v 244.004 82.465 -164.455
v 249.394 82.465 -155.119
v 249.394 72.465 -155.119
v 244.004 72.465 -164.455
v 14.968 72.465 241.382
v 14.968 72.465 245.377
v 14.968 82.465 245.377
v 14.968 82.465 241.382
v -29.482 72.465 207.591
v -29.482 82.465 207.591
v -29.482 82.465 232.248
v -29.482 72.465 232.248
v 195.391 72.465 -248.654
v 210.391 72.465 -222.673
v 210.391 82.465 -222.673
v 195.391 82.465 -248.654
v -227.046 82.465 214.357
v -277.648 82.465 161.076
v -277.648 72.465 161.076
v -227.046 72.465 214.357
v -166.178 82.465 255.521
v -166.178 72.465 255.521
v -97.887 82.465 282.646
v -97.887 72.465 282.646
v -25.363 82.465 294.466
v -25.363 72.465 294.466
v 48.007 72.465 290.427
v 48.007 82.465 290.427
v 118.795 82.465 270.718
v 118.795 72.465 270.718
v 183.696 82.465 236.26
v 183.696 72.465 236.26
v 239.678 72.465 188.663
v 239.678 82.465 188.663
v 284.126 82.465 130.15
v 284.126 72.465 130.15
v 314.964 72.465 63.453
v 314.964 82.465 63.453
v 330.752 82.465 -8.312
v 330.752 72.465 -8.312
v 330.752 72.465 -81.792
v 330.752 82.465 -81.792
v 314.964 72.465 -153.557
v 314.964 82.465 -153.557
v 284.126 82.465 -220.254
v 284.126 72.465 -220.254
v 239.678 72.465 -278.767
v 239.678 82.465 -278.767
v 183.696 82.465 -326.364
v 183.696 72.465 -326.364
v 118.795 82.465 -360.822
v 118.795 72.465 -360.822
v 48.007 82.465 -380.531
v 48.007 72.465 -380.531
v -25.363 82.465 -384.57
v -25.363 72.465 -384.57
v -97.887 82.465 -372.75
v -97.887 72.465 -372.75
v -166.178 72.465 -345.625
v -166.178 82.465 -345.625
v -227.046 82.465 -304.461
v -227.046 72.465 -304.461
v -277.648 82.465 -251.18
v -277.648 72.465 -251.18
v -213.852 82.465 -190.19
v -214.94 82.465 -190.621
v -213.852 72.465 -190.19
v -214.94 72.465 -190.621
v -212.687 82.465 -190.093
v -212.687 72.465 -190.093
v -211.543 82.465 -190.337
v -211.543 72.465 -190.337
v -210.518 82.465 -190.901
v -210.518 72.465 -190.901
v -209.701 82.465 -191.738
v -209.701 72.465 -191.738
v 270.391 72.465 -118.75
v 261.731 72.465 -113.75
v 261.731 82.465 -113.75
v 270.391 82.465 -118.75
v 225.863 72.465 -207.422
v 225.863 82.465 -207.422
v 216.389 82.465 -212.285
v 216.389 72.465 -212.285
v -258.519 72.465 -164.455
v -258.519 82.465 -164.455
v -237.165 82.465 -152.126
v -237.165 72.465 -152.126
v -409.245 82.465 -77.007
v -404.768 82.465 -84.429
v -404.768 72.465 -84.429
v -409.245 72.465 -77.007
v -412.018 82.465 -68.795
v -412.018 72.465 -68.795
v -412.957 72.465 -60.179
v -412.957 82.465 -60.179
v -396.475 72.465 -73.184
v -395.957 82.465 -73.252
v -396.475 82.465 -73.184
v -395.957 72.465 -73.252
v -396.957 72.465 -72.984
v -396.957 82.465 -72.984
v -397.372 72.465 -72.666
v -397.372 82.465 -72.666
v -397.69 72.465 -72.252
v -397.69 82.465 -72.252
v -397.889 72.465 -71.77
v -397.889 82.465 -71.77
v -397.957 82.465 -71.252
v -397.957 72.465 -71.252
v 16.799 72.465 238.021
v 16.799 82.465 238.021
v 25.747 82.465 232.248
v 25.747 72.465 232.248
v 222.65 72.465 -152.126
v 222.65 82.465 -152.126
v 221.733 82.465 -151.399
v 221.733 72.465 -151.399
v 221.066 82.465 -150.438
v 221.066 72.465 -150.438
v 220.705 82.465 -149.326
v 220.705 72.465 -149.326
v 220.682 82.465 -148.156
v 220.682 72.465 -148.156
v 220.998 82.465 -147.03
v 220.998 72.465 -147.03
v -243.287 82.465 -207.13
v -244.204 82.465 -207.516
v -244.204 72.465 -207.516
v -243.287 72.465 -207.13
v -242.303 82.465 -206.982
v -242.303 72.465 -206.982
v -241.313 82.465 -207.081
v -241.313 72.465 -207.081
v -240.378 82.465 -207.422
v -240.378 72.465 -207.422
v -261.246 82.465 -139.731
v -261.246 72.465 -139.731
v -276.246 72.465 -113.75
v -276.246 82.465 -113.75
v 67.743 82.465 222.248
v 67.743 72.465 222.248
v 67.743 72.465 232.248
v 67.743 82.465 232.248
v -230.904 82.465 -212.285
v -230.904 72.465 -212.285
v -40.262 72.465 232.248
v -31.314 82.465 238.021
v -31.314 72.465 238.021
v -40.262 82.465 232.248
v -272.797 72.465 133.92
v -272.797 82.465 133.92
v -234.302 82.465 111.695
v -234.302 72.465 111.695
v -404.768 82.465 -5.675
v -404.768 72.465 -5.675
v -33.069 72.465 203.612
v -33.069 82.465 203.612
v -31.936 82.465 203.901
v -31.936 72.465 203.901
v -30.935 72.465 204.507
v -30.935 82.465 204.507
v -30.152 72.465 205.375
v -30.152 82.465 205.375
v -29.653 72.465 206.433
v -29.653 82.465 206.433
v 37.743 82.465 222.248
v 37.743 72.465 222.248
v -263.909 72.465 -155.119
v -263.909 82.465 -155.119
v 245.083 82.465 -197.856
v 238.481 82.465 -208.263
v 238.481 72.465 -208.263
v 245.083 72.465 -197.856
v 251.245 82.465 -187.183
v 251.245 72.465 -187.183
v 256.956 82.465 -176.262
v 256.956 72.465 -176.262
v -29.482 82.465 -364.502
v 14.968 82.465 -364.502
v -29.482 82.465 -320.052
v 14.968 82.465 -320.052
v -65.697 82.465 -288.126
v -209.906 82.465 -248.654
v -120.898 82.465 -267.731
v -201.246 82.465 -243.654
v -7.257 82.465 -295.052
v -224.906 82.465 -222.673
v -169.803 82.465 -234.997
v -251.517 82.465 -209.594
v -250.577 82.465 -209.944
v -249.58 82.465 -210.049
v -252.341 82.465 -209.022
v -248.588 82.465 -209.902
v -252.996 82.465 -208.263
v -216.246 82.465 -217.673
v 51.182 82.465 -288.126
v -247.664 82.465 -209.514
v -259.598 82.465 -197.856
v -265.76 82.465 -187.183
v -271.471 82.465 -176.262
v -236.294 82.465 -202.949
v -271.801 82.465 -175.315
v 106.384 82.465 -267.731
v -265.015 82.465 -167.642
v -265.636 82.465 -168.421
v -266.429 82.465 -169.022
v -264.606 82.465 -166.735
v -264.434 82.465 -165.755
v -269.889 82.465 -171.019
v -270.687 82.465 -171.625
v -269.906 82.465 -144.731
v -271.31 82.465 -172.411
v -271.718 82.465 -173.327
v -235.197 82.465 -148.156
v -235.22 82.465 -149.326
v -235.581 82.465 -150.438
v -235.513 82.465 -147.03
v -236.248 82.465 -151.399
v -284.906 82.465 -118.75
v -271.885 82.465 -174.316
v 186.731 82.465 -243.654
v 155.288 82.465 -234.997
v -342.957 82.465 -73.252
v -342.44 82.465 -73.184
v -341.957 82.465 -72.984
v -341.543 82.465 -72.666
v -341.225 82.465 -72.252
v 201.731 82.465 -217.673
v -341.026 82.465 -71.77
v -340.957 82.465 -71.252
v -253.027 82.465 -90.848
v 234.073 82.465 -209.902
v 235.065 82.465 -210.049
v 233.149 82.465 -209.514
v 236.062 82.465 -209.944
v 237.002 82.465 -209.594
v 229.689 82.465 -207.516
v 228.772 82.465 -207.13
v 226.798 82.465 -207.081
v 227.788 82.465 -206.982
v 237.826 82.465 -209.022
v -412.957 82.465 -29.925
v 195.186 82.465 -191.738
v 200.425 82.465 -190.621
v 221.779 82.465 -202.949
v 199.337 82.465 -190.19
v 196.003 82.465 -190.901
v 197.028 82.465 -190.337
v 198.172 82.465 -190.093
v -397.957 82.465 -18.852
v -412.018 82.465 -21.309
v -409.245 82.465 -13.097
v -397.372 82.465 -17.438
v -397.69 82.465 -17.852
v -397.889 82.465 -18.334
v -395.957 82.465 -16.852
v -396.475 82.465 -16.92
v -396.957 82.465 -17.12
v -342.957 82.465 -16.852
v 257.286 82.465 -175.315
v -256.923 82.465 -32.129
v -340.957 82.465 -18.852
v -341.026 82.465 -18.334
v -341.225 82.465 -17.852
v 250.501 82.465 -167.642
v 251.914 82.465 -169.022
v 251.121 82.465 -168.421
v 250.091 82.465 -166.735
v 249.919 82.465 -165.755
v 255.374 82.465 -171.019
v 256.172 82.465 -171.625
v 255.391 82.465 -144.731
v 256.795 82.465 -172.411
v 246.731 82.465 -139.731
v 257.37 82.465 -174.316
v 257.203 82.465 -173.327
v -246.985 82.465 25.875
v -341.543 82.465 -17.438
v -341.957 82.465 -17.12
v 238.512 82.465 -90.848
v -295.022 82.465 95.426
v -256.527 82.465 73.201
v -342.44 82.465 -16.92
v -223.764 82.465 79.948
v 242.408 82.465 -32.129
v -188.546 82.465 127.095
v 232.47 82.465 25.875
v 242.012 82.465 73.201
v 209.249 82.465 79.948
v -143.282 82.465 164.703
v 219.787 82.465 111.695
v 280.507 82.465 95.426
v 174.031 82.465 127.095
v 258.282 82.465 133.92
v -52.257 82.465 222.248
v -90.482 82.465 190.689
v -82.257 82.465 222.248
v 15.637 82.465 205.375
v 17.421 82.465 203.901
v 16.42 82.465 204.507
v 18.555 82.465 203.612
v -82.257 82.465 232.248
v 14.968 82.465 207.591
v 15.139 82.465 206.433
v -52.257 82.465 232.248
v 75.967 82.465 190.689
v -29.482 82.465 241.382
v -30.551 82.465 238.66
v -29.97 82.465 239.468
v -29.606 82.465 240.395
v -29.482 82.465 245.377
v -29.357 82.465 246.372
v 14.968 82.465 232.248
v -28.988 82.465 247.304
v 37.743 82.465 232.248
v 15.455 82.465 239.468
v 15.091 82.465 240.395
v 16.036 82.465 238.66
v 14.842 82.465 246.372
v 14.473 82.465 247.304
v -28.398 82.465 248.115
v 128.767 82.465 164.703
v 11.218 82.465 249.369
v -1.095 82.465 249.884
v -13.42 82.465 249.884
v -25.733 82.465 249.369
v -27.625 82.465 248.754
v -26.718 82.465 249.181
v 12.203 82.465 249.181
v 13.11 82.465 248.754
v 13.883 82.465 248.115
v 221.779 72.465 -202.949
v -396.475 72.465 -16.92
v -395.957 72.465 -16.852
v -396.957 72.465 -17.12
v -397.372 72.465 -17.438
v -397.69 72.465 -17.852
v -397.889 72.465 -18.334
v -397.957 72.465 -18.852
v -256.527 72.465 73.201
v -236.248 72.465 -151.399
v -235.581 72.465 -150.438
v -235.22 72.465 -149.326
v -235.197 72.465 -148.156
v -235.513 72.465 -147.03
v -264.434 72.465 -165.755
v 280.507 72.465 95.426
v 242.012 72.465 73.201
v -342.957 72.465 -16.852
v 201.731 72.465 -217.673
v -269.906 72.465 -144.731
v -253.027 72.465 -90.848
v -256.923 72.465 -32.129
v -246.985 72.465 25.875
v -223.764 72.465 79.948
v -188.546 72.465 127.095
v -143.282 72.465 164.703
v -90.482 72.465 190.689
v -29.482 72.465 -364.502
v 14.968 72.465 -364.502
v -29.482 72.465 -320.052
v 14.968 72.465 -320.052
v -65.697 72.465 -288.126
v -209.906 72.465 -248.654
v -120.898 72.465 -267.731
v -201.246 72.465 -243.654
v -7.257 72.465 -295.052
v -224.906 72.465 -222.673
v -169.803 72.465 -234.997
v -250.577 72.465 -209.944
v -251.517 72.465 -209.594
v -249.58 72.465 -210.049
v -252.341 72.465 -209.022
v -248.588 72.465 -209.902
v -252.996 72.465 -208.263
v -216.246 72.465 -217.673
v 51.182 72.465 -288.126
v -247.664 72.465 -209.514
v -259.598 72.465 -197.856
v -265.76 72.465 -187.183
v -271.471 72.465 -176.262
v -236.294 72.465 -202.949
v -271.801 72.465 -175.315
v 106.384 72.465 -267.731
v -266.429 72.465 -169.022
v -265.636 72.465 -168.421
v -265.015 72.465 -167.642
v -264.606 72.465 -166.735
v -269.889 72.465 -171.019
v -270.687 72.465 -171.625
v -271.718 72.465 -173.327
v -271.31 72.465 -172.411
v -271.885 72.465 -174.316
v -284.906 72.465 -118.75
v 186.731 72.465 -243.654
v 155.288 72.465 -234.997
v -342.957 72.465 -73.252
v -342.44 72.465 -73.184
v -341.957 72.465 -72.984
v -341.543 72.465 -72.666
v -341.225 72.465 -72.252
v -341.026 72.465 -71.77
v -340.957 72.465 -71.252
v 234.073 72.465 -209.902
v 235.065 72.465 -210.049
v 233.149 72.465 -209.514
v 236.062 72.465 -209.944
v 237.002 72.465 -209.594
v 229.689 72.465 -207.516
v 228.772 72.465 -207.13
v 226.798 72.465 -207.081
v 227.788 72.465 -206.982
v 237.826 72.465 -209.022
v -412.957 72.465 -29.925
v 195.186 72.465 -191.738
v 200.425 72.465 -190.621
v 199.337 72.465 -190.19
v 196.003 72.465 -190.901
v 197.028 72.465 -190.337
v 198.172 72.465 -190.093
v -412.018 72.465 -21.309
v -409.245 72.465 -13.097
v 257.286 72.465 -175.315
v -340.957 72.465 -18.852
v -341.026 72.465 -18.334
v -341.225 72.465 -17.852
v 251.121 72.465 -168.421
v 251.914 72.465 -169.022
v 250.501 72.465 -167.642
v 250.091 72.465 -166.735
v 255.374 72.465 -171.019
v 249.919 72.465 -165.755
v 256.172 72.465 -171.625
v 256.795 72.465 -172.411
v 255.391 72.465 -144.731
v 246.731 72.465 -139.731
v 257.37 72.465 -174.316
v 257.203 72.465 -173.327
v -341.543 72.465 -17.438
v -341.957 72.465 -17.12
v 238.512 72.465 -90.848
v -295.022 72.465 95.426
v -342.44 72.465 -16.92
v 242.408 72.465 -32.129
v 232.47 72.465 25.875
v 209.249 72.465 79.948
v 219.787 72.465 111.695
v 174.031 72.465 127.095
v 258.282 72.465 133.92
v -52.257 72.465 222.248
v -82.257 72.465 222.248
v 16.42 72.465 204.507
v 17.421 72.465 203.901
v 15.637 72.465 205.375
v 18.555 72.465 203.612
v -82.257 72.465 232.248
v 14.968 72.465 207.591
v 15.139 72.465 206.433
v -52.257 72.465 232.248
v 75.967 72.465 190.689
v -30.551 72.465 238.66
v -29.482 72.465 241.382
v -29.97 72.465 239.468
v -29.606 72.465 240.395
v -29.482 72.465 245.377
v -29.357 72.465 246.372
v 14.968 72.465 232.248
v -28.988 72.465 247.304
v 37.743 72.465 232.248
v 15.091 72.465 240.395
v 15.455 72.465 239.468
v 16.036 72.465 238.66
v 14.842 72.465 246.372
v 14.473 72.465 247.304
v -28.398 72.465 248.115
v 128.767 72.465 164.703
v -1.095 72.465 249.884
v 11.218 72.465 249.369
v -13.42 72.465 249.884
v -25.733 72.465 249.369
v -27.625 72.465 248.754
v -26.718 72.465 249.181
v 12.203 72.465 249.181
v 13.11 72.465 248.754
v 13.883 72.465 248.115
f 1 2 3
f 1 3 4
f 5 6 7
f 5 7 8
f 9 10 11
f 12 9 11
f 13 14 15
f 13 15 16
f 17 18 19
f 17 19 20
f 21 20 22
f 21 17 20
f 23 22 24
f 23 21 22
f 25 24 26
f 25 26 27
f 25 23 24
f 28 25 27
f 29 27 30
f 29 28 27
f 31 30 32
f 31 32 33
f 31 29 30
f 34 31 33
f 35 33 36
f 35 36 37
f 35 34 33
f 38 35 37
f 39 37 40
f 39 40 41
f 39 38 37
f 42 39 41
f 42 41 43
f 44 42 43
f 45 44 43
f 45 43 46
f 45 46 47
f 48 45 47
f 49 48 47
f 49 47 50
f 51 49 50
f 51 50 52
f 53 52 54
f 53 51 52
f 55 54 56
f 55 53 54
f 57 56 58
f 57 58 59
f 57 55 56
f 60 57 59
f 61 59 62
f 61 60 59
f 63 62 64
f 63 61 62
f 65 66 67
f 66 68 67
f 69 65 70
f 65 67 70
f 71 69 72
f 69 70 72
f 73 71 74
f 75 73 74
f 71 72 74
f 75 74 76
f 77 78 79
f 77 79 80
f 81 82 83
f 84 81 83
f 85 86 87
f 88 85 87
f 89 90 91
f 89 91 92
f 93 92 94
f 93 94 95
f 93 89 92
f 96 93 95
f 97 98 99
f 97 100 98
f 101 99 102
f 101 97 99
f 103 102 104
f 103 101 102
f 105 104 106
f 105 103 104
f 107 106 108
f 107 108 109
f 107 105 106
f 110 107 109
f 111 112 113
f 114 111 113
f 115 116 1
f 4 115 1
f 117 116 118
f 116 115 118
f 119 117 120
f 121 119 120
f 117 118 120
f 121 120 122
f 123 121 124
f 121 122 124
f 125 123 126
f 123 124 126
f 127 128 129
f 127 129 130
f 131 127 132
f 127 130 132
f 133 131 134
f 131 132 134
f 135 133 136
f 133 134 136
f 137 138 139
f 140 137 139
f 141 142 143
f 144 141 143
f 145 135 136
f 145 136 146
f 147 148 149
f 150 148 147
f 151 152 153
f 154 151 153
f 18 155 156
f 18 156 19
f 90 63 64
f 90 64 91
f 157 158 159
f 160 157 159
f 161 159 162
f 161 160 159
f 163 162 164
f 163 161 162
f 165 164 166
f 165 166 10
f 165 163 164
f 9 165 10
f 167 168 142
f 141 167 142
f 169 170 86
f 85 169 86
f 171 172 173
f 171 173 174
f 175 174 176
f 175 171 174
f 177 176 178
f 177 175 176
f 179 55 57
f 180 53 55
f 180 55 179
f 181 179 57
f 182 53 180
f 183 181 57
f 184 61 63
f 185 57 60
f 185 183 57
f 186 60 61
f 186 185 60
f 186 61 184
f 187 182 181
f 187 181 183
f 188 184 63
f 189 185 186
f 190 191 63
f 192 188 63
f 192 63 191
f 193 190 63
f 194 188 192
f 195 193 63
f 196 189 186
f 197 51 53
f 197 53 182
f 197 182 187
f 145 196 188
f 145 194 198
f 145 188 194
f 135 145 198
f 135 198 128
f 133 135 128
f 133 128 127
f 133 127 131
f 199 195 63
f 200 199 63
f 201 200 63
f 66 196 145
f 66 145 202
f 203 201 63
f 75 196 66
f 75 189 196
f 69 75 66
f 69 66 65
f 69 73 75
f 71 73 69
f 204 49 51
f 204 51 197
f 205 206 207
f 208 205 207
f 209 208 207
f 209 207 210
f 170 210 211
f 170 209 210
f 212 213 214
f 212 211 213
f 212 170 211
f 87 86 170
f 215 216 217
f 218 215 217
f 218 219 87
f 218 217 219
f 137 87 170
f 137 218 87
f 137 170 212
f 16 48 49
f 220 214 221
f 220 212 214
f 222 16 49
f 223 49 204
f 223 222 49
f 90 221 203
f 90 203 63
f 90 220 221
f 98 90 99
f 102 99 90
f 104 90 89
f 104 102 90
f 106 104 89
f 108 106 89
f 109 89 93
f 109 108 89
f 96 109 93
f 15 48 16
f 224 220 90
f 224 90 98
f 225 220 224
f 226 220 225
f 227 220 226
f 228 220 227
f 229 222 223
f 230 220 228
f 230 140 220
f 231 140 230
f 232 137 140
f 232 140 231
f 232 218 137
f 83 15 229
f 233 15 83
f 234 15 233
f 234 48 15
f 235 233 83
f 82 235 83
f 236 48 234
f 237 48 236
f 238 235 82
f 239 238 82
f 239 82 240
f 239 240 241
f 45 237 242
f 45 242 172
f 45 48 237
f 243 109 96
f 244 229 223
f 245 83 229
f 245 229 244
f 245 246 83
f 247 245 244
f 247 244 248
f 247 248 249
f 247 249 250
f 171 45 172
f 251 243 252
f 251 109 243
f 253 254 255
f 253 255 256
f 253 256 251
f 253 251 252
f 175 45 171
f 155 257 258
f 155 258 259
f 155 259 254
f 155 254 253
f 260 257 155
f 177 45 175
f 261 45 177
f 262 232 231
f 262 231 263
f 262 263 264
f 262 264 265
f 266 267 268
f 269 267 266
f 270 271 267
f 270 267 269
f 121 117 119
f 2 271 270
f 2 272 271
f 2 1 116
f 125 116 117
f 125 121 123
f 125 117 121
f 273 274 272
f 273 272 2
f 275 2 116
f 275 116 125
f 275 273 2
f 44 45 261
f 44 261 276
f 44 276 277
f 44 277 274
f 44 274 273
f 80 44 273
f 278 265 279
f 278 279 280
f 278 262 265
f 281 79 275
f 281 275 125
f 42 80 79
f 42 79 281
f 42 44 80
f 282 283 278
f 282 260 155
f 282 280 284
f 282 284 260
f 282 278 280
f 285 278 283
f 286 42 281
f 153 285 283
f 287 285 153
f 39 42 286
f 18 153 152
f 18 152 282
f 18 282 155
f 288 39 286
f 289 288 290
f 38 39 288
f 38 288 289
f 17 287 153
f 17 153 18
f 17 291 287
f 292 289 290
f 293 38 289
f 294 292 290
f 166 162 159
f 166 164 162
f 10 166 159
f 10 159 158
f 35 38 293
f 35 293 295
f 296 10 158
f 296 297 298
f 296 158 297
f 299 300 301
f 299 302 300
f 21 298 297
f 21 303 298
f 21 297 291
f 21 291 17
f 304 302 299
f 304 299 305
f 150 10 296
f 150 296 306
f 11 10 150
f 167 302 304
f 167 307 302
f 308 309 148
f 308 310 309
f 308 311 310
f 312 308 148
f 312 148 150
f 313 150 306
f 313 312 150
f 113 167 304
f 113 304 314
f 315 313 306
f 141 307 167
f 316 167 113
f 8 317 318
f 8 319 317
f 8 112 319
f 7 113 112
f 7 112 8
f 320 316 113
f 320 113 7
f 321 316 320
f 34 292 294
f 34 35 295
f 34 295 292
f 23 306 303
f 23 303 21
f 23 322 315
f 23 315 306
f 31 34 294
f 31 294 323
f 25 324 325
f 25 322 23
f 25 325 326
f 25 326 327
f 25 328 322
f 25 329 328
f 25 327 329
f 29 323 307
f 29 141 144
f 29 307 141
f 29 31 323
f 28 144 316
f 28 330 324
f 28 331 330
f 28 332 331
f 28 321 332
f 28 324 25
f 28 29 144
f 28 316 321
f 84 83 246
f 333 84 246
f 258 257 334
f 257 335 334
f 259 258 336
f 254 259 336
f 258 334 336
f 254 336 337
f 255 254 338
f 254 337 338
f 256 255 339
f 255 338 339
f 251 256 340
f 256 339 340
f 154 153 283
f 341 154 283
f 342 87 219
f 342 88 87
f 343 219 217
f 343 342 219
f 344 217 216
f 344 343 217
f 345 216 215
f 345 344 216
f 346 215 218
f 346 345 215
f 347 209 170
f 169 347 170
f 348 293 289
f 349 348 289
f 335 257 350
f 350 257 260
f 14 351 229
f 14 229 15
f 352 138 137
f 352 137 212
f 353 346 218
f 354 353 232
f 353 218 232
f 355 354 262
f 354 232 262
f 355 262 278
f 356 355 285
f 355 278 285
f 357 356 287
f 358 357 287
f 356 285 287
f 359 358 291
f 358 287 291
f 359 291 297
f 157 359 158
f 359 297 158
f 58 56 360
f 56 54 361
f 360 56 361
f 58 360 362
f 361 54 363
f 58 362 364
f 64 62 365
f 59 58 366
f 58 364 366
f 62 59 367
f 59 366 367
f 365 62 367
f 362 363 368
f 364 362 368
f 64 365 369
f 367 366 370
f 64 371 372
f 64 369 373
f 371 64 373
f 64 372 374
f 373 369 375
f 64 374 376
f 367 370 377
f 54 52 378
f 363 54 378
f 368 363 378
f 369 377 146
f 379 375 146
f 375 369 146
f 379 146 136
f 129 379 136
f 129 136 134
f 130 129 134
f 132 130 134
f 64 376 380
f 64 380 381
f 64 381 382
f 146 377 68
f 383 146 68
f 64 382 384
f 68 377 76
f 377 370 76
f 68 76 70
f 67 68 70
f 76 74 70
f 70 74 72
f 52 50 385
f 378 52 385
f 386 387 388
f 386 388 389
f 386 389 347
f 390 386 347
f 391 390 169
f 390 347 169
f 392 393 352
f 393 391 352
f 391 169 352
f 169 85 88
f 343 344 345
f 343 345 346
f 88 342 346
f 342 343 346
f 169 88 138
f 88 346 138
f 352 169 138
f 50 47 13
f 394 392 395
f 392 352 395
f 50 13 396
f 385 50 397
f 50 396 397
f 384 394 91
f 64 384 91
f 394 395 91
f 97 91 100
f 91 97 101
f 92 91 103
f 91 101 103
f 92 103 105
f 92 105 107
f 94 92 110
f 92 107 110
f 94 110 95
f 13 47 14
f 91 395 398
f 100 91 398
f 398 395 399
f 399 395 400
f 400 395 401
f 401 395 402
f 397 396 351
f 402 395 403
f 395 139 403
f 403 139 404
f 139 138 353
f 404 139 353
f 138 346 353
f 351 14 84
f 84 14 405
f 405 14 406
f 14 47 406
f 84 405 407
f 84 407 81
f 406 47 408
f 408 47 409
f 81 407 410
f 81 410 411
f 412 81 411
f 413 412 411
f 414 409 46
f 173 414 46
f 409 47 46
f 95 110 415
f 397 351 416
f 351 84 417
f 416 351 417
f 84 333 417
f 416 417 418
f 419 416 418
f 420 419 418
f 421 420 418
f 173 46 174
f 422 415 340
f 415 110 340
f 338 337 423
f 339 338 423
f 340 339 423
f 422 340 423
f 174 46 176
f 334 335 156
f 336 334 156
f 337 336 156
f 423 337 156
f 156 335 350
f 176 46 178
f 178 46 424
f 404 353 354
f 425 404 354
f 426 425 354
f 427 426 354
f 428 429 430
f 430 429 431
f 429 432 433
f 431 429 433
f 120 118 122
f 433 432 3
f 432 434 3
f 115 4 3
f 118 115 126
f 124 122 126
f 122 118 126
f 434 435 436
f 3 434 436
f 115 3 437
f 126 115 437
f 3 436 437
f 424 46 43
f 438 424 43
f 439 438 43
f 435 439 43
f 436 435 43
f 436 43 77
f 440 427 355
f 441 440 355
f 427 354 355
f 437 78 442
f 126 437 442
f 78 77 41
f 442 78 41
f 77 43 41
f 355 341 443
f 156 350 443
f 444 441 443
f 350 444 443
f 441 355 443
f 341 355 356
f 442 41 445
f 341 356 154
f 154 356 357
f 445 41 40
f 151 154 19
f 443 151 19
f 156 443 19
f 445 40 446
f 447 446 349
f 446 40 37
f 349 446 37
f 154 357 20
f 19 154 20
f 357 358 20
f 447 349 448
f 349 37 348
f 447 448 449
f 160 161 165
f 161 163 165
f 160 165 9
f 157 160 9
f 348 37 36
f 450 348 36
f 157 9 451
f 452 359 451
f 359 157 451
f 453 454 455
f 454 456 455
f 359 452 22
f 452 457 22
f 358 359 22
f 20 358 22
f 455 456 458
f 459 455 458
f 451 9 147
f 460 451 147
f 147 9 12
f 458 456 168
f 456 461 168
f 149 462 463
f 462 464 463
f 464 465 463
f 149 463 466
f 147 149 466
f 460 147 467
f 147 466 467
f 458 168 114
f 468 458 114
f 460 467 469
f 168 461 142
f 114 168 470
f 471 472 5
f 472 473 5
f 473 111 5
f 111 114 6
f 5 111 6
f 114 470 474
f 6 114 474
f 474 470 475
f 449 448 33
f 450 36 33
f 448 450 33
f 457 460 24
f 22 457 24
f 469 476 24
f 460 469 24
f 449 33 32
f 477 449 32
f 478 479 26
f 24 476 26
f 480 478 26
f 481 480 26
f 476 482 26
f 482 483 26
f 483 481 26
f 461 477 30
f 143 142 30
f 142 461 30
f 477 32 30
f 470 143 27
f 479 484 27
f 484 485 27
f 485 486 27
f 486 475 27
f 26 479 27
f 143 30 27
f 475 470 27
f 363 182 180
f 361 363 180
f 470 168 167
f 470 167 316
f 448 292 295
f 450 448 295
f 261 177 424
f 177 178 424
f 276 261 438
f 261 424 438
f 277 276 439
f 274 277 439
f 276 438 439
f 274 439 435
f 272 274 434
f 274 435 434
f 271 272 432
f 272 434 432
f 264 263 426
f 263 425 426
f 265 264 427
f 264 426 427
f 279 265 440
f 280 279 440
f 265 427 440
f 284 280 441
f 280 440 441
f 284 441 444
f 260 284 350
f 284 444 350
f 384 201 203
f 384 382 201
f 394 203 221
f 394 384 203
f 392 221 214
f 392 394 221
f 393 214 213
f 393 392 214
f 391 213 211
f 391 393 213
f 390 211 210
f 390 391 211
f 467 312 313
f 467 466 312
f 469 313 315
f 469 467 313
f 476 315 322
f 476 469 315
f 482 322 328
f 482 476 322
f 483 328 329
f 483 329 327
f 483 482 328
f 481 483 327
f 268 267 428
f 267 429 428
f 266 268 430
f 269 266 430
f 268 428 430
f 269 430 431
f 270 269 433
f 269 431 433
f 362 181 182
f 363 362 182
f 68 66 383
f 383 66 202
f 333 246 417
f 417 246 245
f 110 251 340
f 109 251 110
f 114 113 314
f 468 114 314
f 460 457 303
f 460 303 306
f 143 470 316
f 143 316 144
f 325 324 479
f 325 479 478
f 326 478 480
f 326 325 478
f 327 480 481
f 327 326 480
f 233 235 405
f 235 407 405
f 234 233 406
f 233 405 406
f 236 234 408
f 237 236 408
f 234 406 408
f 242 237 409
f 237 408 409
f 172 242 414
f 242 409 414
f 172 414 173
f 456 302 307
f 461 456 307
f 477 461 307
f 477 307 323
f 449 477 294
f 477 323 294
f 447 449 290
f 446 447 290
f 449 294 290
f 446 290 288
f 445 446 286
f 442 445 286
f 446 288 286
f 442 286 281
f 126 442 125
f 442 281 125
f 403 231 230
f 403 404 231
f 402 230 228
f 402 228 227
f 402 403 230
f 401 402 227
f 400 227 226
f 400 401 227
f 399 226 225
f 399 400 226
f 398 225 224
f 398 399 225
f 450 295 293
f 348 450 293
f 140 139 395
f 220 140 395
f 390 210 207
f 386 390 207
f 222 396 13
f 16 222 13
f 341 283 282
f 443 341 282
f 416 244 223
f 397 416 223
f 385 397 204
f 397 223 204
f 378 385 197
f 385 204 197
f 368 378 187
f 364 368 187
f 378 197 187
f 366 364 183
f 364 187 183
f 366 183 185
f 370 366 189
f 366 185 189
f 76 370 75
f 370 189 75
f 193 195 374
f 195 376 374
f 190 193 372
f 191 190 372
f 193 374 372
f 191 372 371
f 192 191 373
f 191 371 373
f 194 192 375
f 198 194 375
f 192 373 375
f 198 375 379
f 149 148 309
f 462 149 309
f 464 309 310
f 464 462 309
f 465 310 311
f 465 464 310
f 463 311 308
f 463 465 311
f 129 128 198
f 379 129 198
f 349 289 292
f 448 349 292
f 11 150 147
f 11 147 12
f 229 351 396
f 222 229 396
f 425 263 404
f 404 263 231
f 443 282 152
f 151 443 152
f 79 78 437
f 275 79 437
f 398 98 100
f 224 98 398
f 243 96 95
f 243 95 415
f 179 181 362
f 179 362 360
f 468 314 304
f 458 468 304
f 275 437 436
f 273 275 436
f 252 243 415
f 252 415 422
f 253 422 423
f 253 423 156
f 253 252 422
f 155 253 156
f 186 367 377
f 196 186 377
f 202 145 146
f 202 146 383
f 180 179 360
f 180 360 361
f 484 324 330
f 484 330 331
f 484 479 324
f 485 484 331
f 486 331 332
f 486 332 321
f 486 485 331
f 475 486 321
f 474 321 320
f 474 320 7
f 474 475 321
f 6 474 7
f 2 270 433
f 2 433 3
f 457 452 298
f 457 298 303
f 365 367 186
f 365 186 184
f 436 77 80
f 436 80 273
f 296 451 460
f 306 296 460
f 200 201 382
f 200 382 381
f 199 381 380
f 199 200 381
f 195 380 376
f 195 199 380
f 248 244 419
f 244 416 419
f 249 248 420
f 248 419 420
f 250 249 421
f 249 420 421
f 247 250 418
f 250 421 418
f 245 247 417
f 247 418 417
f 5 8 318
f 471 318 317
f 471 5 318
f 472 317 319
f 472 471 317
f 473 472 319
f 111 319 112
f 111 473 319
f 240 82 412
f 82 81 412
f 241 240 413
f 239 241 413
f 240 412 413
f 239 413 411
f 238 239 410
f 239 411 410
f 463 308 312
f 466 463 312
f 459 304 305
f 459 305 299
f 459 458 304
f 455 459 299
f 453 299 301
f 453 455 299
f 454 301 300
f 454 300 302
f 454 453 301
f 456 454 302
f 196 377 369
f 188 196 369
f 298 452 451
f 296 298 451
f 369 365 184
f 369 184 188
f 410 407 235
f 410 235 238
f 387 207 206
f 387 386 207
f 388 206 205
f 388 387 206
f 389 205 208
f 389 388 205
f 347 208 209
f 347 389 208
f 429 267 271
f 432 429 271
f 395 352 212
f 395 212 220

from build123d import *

# Parameters (mm, degrees)
SKETCH1_W           = 44.45
SKETCH1_H           = 44.45
SKETCH1_W_2         = 57
SKETCH1_H_2         = 56.4
BOSS_EXTRUDE1_DEPTH = 10
CUT_EXTRUDE1_DEPTH  = 10
CIRPATTERN1_COUNT   = 3
BOSS_EXTRUDE2_DEPTH = 10
CIRPATTERN2_COUNT   = 3
SKETCH7_W           = 30
SKETCH7_H           = 10
CUT_EXTRUDE2_DEPTH  = 10
CIRPATTERN3_COUNT   = 3
FILLET1_R           = 4
FILLET2_R           = 2


with BuildPart() as part:
    # Sketch1 → Boss-Extrude1 (new body)
    with BuildSketch(Plane(origin=(0, 82.464823413, 0), x_dir=(1, 0, 0), z_dir=(0, 1, 0))):
        with BuildLine():
            Line((-412.957473883, 60.178595798), (-412.957473883, 29.92539468))
            ThreePointArc((-412.957473883, 29.92539468), (-410.854889329, 17.127508038), (-404.768178759, 5.675053336))
            Line((-404.768178759, 5.675053336), (-277.648465327, -161.075906186))
            ThreePointArc((-277.648465327, -161.075906186), (332.742526117, 45.051995239), (-277.648465327, 251.179896664))
            Line((-277.648465327, 251.179896664), (-404.768178759, 84.428937143))
            ThreePointArc((-404.768178759, 84.428937143), (-410.854889329, 72.97648244), (-412.957473883, 60.178595798))
        make_face()
        with BuildLine():
            ThreePointArc((-234.019080144, 150.30965019), (-223.763824829, -79.948004761), (-29.482473883, -203.958143862))
            Line((-29.482473883, -203.958143862), (-29.482473883, -262.248004761))
            Line((-29.482473883, -262.248004761), (14.967526117, -262.248004761))
            Line((14.967526117, -262.248004761), (14.967526117, -203.958143862))
            ThreePointArc((14.967526117, -203.958143862), (209.248877063, -79.948004761), (219.504132378, 150.30965019))
            Line((219.504132378, 150.30965019), (269.9846327, 179.45458064))
            Line((269.9846327, 179.45458064), (247.7596327, 217.949409838))
            Line((247.7596327, 217.949409838), (197.279132378, 188.804479389))
            ThreePointArc((197.279132378, 188.804479389), (-7.257473883, 295.051995239), (-211.794080144, 188.804479389))
            Line((-211.794080144, 188.804479389), (-262.274580466, 217.949409838))
            Line((-262.274580466, 217.949409838), (-284.499580466, 179.45458064))
            Line((-284.499580466, 179.45458064), (-234.019080144, 150.30965019))
        make_face(mode=Mode.SUBTRACT)
        with Locations((-7.257473883, 342.276995239)):
            Rectangle(SKETCH1_W, SKETCH1_H, mode=Mode.SUBTRACT)
        Polygon((-272.796789122, -133.92041936), (-234.301959924, -111.69541936), (-256.526959924, -73.200590162), (-295.021789122, -95.425590162), align=None, mode=Mode.SUBTRACT)
        with Locations((-369.457473883, 45.051995239)):
            Rectangle(SKETCH1_W_2, SKETCH1_H_2, mode=Mode.SUBTRACT)
        Polygon((219.787012158, -111.69541936), (258.281841356, -133.92041936), (280.506841356, -95.425590162), (242.012012158, -73.200590162), align=None, mode=Mode.SUBTRACT)
    extrude(amount=-BOSS_EXTRUDE1_DEPTH)

    # Sketch5 → Cut-Extrude1 (cut)
    with BuildSketch(Plane(origin=(0, 82.464823413, 0), x_dir=(1, 0, 0), z_dir=(0, 1, 0))):
        Polygon((14.967526117, -239.202482577), (25.746966731, -232.248004761), (14.967526117, -232.248004761), align=None)
        Polygon((-40.261914497, -232.248004761), (-29.482473883, -232.248004761), (-29.482473883, -239.202482577), align=None)
    cut_extrude1 = extrude(amount=-CUT_EXTRUDE1_DEPTH, mode=Mode.SUBTRACT)

    # CirPattern1: Cut-Extrude1 ×3 about axis
    cirpattern1_axis = Axis((-7.257473883, 0, -45.051995239), (0, 1, 0))
    for i in range(1, CIRPATTERN1_COUNT):
        add(cut_extrude1.rotate(cirpattern1_axis, i * 360 / CIRPATTERN1_COUNT), mode=Mode.SUBTRACT)

    # Sketch6 → Boss-Extrude2 (add)
    with BuildSketch(Plane(origin=(0, 82.464823413, 0), x_dir=(1, 0, 0), z_dir=(0, 1, 0))):
        with BuildLine():
            Line((-29.482473883, -249.109608943), (-29.482473883, -270.376708747))
            Line((-29.482473883, -270.376708747), (14.967526117, -270.376708747))
            Line((14.967526117, -270.376708747), (14.967526117, -249.109608943))
            ThreePointArc((14.967526117, -249.109608943), (-7.257473883, -249.948004761), (-29.482473883, -249.109608943))
        make_face()
    boss_extrude2 = extrude(amount=-BOSS_EXTRUDE2_DEPTH)

    # CirPattern2: Boss-Extrude2 ×3 about axis
    cirpattern2_axis = Axis((-7.257473883, 72.464823413, -45.051995239), (0, 1, 0))
    for i in range(1, CIRPATTERN2_COUNT):
        add(boss_extrude2.rotate(cirpattern2_axis, i * 360 / CIRPATTERN2_COUNT))

    # Sketch7 → Cut-Extrude2 (cut)
    with BuildSketch(Plane.XZ.offset(-72.464823413)):
        with Locations((52.742526117, 227.248004761)):
            Rectangle(SKETCH7_W, SKETCH7_H)
        with Locations((-67.257473883, 227.248004761)):
            Rectangle(SKETCH7_W, SKETCH7_H)
    cut_extrude2 = extrude(amount=-CUT_EXTRUDE2_DEPTH, mode=Mode.SUBTRACT)

    # CirPattern3: Cut-Extrude2 ×3 about axis
    cirpattern3_axis = Axis((-7.257473883, 0, -45.051995239), (0, 1, 0))
    for i in range(1, CIRPATTERN3_COUNT):
        add(cut_extrude2.rotate(cirpattern3_axis, i * 360 / CIRPATTERN3_COUNT), mode=Mode.SUBTRACT)

    # Fillet1
    fillet1_edges = [part.edges().sort_by_distance(p)[0] for p in [
        (-29.482473883, 77.464823413, 239.202482577),
        (14.967526117, 77.464823413, 239.202482577),
        (250.026625045, 77.464823413, -167.931819548),
        (227.801625045, 77.464823413, -206.426648746),
        (-242.316572811, 77.464823413, -206.426648746),
        (-264.541572811, 77.464823413, -167.931819548),
        (14.967526117, 77.464823413, 249.109608943),
        (-29.482473883, 77.464823413, 249.109608943),
        (258.606448157, 77.464823413, -172.885382731),
        (236.381448157, 77.464823413, -211.380211929),
        (-273.121395923, 77.464823413, -172.885382731),
        (-250.896395923, 77.464823413, -211.380211929),
        (-29.482473883, 77.464823413, 203.958143862),
        (14.967526117, 77.464823413, 203.958143862),
        (219.504132378, 77.464823413, -150.30965019),
        (197.279132378, 77.464823413, -188.804479389),
        (-211.794080144, 77.464823413, -188.804479389),
        (-234.019080144, 77.464823413, -150.30965019),
    ]]
    fillet(fillet1_edges, radius=FILLET1_R)

    # Fillet2
    fillet2_edges = [part.edges().sort_by_distance(p)[0] for p in [
        (-397.957473883, 77.464823413, -73.251995239),
        (-397.957473883, 77.464823413, -16.851995239),
        (-340.957473883, 77.464823413, -16.851995239),
        (-340.957473883, 77.464823413, -73.251995239),
    ]]
    fillet(fillet2_edges, radius=FILLET2_R)


solid = part.part
